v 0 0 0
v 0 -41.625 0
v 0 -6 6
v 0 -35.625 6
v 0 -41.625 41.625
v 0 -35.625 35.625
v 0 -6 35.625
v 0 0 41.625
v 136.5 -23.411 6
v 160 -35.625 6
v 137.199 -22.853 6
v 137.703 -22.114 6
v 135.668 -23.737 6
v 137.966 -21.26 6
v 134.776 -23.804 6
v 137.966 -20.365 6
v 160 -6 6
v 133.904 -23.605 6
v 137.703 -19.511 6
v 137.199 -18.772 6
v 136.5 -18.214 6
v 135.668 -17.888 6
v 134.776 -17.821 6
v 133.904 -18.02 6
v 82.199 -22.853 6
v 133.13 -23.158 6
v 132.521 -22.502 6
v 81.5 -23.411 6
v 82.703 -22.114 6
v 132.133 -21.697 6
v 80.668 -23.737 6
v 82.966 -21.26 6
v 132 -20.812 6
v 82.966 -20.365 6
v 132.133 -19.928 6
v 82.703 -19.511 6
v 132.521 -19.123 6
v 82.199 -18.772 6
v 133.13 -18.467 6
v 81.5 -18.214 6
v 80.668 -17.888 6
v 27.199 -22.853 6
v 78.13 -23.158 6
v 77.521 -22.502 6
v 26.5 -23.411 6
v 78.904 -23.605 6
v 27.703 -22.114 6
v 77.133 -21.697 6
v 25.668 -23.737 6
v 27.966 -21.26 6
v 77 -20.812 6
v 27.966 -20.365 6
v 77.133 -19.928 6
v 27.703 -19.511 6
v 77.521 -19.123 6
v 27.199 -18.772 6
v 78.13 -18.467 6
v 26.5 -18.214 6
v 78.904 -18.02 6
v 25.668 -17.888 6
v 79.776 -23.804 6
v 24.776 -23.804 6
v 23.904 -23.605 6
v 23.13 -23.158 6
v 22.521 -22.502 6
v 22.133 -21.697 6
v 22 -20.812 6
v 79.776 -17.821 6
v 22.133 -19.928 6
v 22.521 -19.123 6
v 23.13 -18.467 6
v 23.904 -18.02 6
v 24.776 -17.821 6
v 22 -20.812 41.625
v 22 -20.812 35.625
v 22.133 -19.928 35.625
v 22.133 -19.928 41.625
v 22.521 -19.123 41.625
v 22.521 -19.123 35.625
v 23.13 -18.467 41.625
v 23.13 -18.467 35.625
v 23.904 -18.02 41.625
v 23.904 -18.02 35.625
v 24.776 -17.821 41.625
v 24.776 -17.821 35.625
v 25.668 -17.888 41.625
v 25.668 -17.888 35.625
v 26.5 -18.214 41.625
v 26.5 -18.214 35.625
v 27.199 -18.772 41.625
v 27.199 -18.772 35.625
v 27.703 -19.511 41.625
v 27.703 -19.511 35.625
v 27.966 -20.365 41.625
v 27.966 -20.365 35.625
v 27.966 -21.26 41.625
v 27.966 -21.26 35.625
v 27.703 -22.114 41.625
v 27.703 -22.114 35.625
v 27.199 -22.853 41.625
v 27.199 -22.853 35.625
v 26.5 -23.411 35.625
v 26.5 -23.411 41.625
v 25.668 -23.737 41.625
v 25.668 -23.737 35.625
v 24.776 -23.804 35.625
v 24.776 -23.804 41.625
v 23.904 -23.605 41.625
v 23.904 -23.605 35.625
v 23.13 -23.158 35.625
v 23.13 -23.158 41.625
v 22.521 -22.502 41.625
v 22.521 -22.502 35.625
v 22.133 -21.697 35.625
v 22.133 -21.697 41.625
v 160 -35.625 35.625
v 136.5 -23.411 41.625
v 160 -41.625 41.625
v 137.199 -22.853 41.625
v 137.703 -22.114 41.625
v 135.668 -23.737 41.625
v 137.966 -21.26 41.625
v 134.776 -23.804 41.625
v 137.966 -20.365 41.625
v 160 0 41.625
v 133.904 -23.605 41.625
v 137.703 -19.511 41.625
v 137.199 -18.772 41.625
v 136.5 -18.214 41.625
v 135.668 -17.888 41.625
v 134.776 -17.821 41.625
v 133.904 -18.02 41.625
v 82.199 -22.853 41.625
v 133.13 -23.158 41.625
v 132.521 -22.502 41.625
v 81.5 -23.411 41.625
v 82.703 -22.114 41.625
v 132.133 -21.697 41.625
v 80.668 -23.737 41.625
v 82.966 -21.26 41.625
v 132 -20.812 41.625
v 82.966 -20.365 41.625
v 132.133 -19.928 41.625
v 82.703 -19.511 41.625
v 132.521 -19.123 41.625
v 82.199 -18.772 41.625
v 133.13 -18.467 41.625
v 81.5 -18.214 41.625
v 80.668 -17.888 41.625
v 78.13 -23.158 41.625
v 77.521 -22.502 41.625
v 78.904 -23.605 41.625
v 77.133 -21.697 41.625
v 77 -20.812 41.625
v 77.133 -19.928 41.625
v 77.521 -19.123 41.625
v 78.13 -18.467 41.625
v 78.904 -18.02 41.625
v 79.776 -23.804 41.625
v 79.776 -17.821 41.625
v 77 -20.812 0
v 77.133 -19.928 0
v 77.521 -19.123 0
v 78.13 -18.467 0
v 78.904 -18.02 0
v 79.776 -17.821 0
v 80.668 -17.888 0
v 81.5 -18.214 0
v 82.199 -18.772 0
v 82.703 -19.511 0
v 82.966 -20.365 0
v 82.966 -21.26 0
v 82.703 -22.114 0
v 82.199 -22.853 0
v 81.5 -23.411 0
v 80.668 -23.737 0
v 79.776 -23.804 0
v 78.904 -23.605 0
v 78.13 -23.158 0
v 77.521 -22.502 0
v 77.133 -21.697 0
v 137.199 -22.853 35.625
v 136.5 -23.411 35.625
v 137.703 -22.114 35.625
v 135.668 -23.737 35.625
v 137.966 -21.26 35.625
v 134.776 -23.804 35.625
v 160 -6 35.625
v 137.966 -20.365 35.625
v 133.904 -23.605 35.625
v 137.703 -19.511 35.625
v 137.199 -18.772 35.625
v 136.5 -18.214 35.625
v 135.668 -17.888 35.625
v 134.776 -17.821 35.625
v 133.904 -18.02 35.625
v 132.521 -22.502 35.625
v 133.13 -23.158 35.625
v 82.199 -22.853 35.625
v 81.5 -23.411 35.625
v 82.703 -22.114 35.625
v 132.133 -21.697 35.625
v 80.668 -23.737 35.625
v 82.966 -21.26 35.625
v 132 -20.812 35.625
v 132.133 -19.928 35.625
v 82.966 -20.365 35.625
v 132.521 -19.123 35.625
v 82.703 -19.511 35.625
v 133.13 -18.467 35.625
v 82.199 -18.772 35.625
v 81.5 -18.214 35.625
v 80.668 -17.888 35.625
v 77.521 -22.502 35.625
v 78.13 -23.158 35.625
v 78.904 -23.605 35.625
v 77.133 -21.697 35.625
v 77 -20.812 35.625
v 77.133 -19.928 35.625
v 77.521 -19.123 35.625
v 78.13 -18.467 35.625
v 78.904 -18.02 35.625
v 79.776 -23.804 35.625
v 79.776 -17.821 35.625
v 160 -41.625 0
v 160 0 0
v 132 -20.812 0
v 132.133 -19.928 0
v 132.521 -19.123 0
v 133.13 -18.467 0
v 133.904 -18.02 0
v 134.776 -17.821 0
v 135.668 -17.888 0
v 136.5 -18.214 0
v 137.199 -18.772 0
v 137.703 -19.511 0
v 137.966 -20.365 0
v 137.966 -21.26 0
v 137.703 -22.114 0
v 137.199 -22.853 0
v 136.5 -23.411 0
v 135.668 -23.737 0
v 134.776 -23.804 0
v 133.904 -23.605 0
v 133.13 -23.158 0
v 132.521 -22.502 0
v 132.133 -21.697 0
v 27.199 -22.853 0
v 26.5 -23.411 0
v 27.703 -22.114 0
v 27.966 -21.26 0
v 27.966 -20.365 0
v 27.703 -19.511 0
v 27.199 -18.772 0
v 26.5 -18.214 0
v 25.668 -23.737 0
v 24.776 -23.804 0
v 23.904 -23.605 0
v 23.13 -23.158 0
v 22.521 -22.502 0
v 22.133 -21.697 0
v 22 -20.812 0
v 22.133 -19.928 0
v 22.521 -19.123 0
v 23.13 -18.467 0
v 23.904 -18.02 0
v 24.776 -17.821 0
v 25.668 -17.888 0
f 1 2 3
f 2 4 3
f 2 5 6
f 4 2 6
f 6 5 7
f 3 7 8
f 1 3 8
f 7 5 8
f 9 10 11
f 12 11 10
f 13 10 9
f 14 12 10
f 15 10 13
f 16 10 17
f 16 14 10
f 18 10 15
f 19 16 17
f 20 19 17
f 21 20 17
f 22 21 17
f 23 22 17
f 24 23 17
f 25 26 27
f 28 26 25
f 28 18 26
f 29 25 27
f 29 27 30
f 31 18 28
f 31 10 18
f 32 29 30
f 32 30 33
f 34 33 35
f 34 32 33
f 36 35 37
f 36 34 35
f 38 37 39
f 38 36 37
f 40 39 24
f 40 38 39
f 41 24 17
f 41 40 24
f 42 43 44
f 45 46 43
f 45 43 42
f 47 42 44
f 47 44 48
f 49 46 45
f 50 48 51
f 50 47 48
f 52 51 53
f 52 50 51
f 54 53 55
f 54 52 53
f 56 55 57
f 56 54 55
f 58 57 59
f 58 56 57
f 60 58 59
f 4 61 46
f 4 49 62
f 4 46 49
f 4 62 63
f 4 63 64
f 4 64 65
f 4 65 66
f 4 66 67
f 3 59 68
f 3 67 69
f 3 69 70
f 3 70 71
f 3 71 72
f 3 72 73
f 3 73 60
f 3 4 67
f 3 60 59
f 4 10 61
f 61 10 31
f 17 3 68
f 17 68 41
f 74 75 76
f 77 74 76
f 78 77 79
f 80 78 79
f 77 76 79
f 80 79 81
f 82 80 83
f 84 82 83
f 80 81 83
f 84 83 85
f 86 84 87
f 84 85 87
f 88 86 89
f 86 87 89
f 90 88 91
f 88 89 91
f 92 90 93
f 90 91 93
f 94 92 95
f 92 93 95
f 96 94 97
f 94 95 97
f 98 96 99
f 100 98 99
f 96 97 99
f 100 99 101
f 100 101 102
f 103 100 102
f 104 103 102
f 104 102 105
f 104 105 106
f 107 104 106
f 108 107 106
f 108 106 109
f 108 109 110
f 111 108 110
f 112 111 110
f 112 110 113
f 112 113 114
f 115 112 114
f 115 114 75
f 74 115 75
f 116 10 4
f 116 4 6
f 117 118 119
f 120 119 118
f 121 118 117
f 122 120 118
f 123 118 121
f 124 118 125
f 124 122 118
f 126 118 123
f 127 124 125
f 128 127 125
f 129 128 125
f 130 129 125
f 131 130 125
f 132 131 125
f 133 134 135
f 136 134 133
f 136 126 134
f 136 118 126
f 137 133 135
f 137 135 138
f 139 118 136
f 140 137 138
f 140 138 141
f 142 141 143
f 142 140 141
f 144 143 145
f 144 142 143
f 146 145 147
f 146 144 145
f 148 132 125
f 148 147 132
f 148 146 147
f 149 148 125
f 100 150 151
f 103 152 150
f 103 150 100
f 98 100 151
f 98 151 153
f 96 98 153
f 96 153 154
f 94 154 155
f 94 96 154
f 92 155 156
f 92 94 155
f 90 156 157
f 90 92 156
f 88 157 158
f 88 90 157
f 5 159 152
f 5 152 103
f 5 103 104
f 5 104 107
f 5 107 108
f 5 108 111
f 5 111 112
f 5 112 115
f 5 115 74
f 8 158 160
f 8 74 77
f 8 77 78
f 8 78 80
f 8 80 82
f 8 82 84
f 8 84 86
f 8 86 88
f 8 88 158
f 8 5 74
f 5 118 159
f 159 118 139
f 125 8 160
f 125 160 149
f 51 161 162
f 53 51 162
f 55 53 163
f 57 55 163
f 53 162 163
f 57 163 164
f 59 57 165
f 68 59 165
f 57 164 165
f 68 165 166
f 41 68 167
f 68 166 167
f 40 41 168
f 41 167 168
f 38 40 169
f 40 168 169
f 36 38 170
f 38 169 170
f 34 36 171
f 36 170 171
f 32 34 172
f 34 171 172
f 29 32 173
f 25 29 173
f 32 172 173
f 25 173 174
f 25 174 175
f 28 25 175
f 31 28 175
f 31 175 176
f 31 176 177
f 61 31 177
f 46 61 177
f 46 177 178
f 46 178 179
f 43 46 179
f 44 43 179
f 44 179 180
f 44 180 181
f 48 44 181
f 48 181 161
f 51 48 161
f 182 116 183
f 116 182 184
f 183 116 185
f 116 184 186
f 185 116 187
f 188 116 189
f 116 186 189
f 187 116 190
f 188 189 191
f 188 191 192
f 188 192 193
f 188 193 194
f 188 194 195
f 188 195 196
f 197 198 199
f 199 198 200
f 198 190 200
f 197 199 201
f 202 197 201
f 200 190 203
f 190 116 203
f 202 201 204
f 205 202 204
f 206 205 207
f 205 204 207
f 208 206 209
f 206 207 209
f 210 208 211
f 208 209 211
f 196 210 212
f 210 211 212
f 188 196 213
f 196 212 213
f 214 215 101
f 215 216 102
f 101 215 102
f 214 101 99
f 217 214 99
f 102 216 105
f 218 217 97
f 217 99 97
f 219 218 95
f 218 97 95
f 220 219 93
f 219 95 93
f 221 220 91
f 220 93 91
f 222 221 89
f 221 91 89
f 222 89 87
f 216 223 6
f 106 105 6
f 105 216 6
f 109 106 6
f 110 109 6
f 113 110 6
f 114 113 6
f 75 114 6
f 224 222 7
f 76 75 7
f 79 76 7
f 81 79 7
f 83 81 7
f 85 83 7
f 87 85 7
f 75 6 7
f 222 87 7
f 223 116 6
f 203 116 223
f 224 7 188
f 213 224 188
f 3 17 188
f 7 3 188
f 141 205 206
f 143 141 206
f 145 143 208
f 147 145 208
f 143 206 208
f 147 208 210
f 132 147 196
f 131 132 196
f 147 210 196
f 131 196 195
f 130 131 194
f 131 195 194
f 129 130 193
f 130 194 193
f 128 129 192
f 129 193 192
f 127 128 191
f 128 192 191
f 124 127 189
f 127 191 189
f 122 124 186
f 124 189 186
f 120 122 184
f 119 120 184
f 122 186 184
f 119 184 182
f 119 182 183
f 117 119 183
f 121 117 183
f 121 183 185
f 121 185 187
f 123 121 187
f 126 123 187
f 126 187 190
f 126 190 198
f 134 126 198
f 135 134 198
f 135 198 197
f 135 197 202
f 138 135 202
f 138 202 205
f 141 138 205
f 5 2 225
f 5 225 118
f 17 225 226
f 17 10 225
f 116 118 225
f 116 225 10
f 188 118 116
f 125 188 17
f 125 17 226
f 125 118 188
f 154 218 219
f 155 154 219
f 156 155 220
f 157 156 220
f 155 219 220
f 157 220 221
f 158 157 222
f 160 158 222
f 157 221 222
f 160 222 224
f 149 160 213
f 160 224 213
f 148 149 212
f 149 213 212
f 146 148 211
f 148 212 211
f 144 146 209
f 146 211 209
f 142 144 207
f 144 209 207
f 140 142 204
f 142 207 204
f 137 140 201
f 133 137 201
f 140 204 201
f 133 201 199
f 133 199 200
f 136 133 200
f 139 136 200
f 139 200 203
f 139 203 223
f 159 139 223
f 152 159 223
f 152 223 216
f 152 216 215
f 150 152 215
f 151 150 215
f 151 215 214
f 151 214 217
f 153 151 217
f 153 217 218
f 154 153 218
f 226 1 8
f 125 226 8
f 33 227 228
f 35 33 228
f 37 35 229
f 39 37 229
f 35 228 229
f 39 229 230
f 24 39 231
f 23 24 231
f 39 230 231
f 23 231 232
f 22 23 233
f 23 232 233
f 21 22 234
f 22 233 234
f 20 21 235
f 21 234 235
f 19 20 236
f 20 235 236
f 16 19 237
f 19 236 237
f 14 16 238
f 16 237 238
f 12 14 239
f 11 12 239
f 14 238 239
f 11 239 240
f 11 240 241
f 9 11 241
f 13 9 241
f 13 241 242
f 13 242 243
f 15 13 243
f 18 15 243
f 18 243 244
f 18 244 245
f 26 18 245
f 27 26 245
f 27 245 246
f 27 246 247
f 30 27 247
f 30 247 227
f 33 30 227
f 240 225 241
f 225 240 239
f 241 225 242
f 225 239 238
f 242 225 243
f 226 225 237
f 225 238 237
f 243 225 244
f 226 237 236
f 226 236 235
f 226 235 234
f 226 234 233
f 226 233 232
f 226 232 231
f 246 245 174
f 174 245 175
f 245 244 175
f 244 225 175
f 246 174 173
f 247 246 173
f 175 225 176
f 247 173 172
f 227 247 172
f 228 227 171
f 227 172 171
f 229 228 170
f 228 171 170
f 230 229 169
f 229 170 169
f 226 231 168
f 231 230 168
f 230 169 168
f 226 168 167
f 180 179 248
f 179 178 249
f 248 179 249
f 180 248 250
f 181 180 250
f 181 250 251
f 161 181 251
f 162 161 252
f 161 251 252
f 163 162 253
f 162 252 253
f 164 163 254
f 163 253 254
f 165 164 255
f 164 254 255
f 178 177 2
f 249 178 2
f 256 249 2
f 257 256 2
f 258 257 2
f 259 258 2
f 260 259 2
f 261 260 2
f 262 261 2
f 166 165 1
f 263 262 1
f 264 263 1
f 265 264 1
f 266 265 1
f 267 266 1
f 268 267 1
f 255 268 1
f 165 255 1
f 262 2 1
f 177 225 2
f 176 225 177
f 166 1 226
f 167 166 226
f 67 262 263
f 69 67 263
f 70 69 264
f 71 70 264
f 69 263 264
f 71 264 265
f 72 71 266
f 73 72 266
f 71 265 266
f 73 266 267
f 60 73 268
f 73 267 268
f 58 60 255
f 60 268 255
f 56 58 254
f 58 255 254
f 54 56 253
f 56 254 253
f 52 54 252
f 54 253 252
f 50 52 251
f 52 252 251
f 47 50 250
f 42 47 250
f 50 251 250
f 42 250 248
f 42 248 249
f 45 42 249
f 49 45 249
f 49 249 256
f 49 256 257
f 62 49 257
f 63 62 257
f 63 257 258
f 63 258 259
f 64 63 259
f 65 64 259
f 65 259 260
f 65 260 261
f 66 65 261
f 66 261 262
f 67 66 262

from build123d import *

# Parameters (mm, degrees)
F0_W     = 41.625001
F0_H     = 41.625001
F0_W_2   = 29.625001
F0_H_2   = 29.625001
F1_DEPTH = 160
F3_D     = 6


with BuildPart() as f1:
    # F0 (on Right) → F1 (new body)
    with BuildSketch(Plane.YZ):
        with Locations((-20.8125, 20.8125)):
            Rectangle(F0_W, F0_H)
        with Locations((-20.8125, 20.8125)):
            Rectangle(F0_W_2, F0_H_2, mode=Mode.SUBTRACT)
    extrude(amount=F1_DEPTH)

    # F3 (through all)
    with Locations(Plane.XY.offset(41.625001)):
        with Locations((135, -20.8125), (80, -20.8125), (25, -20.8125)):
            Hole(F3_D / 2)


solid = f1.part
